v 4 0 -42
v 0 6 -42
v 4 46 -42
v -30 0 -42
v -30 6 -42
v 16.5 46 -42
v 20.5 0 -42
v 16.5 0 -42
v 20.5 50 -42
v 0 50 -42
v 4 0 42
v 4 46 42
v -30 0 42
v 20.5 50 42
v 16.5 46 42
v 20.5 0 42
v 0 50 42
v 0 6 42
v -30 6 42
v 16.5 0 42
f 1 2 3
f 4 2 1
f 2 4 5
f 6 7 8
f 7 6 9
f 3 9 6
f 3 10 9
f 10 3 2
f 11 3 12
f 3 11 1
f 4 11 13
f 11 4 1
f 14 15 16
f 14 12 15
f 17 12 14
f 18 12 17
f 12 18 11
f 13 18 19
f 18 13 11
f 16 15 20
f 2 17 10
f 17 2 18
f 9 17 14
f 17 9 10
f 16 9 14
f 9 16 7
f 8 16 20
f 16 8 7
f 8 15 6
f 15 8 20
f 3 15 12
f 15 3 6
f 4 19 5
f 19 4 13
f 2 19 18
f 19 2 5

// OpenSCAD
// 8-tube PCR strip holder that hooks over a 12 mm ice-bucket wall
// Print orientation: rests on XY plane (z = 0), builds upward (+Z), centred on x = 0.
// Profile is in the YZ plane, extruded 84 mm along X.

$fn = 64;

// ---- Dimensions (mm) ----
extrude_x   = 84;   // length of the part along X

// Upside-down U profile (YZ plane)
inner_leg_y0 = 0;    // inner face of inner leg
inner_leg_y1 = 4;    // outer face of inner leg (wall thickness 12 -> gap 12.5)
outer_leg_y0 = 16.5; // inner face of outer leg
outer_leg_y1 = 20.5; // outer face of outer leg
leg_z0       = 0;    // bottom of both legs
leg_z1       = 50;   // top of both legs
bridge_z0    = 46;   // bottom of top bridge
bridge_z1    = 50;   // top of top bridge
// gap between inner and outer legs = 16.5 - 4 = 12.5 mm (clears 12 mm wall)

// Flat ledge that reaches into the ice
ledge_y0     = -30;  // far end of ledge (toward -Y)
ledge_y1     = 0;    // meets the foot of the inner leg
ledge_z0     = 0;    // bottom of ledge
ledge_z1     = 6;    // top of ledge (6 mm thick)

// Tube holes
hole_d       = 6.4;  // through-hole diameter
hole_pitch   = 9;    // spacing along X
hole_y       = -15;  // hole centre in Y
hole_z0      = -1;   // extend below z = 0
hole_z1      = 7;    // extend above ledge top (6)

// ---- Build the part ----
module part() {
    union() {
        // Upside-down U: two vertical legs joined by a top bridge
        // Inner leg
        linear_extrude(height = extrude_x, center = true) {
            polygon(points = [
                [inner_leg_y0, leg_z0],
                [inner_leg_y1, leg_z0],
                [inner_leg_y1, leg_z1],
                [inner_leg_y0, leg_z1]
            ]);
        }
        // Outer leg
        linear_extrude(height = extrude_x, center = true) {
            polygon(points = [
                [outer_leg_y0, leg_z0],
                [outer_leg_y1, leg_z0],
                [outer_leg_y1, leg_z1],
                [outer_leg_y0, leg_z1]
            ]);
        }
        // Top bridge spanning the 12.5 mm gap
        linear_extrude(height = extrude_x, center = true) {
            polygon(points = [
                [inner_leg_y1, bridge_z0],
                [outer_leg_y0, bridge_z0],
                [outer_leg_y0, bridge_z1],
                [inner_leg_y1, bridge_z1]
            ]);
        }

        // Flat ledge reaching toward -Y from the foot of the inner leg
        linear_extrude(height = extrude_x, center = true) {
            polygon(points = [
                [ledge_y0, ledge_z0],
                [ledge_y1, ledge_z0],
                [ledge_y1, ledge_z1],
                [ledge_y0, ledge_z1]
            ]);
        }
    }

    // Eight vertical 6.4 mm through-holes in the ledge, 9 mm apart along X, centred
    difference() {
        // (re-declare the solid so difference can cut it)
        union() {
            linear_extrude(height = extrude_x, center = true) {
                polygon(points = [
                    [inner_leg_y0, leg_z0],
                    [inner_leg_y1, leg_z0],
                    [inner_leg_y1, leg_z1],
                    [inner_leg_y0, leg_z1]
                ]);
            }
            linear_extrude(height = extrude_x, center = true) {
                polygon(points = [
                    [outer_leg_y0, leg_z0],
                    [outer_leg_y1, leg_z0],
                    [outer_leg_y1, leg_z1],
                    [outer_leg_y0, leg_z1]
                ]);
            }
            linear_extrude(height = extrude_x, center = true) {
                polygon(points = [
                    [inner_leg_y1, bridge_z0],
                    [outer_leg_y0, bridge_z0],
                    [outer_leg_y0, bridge_z1],
                    [inner_leg_y1, bridge_z1]
                ]);
            }
            linear_extrude(height = extrude_x, center = true) {
                polygon(points = [
                    [ledge_y0, ledge_z0],
                    [ledge_y1, ledge_z0],
                    [ledge_y1, ledge_z1],
                    [ledge_y0, ledge_z1]
                ]);
            }
        }

        for (i = [-3, -2, -1, 0, 1, 2, 3, 4]) {
            // 8 holes centred: x = -27, -18, -9, 0, 9, 18, 27, 36  ->  wait, that's 8 values but not symmetric.
            // Use symmetric set: -27, -18, -9, 0, 9, 18, 27 is 7. Need 8 centred -> use -27,-18,-9,0,9,18,27,36? 
            // "centred" with 8 holes and 9 mm pitch: total span = 7*9 = 63, so from -31.5 to +31.5.
            // x positions: -31.5, -22.5, -13.5, -4.5, 4.5, 13.5, 22.5, 31.5
            x_pos = -31.5 + i * hole_pitch;
            translate([x_pos, hole_y, 0]) {
                cylinder(h = hole_z1 - hole_z0, r = hole_d / 2, center = false);
            }
        }
    }
}

part();
